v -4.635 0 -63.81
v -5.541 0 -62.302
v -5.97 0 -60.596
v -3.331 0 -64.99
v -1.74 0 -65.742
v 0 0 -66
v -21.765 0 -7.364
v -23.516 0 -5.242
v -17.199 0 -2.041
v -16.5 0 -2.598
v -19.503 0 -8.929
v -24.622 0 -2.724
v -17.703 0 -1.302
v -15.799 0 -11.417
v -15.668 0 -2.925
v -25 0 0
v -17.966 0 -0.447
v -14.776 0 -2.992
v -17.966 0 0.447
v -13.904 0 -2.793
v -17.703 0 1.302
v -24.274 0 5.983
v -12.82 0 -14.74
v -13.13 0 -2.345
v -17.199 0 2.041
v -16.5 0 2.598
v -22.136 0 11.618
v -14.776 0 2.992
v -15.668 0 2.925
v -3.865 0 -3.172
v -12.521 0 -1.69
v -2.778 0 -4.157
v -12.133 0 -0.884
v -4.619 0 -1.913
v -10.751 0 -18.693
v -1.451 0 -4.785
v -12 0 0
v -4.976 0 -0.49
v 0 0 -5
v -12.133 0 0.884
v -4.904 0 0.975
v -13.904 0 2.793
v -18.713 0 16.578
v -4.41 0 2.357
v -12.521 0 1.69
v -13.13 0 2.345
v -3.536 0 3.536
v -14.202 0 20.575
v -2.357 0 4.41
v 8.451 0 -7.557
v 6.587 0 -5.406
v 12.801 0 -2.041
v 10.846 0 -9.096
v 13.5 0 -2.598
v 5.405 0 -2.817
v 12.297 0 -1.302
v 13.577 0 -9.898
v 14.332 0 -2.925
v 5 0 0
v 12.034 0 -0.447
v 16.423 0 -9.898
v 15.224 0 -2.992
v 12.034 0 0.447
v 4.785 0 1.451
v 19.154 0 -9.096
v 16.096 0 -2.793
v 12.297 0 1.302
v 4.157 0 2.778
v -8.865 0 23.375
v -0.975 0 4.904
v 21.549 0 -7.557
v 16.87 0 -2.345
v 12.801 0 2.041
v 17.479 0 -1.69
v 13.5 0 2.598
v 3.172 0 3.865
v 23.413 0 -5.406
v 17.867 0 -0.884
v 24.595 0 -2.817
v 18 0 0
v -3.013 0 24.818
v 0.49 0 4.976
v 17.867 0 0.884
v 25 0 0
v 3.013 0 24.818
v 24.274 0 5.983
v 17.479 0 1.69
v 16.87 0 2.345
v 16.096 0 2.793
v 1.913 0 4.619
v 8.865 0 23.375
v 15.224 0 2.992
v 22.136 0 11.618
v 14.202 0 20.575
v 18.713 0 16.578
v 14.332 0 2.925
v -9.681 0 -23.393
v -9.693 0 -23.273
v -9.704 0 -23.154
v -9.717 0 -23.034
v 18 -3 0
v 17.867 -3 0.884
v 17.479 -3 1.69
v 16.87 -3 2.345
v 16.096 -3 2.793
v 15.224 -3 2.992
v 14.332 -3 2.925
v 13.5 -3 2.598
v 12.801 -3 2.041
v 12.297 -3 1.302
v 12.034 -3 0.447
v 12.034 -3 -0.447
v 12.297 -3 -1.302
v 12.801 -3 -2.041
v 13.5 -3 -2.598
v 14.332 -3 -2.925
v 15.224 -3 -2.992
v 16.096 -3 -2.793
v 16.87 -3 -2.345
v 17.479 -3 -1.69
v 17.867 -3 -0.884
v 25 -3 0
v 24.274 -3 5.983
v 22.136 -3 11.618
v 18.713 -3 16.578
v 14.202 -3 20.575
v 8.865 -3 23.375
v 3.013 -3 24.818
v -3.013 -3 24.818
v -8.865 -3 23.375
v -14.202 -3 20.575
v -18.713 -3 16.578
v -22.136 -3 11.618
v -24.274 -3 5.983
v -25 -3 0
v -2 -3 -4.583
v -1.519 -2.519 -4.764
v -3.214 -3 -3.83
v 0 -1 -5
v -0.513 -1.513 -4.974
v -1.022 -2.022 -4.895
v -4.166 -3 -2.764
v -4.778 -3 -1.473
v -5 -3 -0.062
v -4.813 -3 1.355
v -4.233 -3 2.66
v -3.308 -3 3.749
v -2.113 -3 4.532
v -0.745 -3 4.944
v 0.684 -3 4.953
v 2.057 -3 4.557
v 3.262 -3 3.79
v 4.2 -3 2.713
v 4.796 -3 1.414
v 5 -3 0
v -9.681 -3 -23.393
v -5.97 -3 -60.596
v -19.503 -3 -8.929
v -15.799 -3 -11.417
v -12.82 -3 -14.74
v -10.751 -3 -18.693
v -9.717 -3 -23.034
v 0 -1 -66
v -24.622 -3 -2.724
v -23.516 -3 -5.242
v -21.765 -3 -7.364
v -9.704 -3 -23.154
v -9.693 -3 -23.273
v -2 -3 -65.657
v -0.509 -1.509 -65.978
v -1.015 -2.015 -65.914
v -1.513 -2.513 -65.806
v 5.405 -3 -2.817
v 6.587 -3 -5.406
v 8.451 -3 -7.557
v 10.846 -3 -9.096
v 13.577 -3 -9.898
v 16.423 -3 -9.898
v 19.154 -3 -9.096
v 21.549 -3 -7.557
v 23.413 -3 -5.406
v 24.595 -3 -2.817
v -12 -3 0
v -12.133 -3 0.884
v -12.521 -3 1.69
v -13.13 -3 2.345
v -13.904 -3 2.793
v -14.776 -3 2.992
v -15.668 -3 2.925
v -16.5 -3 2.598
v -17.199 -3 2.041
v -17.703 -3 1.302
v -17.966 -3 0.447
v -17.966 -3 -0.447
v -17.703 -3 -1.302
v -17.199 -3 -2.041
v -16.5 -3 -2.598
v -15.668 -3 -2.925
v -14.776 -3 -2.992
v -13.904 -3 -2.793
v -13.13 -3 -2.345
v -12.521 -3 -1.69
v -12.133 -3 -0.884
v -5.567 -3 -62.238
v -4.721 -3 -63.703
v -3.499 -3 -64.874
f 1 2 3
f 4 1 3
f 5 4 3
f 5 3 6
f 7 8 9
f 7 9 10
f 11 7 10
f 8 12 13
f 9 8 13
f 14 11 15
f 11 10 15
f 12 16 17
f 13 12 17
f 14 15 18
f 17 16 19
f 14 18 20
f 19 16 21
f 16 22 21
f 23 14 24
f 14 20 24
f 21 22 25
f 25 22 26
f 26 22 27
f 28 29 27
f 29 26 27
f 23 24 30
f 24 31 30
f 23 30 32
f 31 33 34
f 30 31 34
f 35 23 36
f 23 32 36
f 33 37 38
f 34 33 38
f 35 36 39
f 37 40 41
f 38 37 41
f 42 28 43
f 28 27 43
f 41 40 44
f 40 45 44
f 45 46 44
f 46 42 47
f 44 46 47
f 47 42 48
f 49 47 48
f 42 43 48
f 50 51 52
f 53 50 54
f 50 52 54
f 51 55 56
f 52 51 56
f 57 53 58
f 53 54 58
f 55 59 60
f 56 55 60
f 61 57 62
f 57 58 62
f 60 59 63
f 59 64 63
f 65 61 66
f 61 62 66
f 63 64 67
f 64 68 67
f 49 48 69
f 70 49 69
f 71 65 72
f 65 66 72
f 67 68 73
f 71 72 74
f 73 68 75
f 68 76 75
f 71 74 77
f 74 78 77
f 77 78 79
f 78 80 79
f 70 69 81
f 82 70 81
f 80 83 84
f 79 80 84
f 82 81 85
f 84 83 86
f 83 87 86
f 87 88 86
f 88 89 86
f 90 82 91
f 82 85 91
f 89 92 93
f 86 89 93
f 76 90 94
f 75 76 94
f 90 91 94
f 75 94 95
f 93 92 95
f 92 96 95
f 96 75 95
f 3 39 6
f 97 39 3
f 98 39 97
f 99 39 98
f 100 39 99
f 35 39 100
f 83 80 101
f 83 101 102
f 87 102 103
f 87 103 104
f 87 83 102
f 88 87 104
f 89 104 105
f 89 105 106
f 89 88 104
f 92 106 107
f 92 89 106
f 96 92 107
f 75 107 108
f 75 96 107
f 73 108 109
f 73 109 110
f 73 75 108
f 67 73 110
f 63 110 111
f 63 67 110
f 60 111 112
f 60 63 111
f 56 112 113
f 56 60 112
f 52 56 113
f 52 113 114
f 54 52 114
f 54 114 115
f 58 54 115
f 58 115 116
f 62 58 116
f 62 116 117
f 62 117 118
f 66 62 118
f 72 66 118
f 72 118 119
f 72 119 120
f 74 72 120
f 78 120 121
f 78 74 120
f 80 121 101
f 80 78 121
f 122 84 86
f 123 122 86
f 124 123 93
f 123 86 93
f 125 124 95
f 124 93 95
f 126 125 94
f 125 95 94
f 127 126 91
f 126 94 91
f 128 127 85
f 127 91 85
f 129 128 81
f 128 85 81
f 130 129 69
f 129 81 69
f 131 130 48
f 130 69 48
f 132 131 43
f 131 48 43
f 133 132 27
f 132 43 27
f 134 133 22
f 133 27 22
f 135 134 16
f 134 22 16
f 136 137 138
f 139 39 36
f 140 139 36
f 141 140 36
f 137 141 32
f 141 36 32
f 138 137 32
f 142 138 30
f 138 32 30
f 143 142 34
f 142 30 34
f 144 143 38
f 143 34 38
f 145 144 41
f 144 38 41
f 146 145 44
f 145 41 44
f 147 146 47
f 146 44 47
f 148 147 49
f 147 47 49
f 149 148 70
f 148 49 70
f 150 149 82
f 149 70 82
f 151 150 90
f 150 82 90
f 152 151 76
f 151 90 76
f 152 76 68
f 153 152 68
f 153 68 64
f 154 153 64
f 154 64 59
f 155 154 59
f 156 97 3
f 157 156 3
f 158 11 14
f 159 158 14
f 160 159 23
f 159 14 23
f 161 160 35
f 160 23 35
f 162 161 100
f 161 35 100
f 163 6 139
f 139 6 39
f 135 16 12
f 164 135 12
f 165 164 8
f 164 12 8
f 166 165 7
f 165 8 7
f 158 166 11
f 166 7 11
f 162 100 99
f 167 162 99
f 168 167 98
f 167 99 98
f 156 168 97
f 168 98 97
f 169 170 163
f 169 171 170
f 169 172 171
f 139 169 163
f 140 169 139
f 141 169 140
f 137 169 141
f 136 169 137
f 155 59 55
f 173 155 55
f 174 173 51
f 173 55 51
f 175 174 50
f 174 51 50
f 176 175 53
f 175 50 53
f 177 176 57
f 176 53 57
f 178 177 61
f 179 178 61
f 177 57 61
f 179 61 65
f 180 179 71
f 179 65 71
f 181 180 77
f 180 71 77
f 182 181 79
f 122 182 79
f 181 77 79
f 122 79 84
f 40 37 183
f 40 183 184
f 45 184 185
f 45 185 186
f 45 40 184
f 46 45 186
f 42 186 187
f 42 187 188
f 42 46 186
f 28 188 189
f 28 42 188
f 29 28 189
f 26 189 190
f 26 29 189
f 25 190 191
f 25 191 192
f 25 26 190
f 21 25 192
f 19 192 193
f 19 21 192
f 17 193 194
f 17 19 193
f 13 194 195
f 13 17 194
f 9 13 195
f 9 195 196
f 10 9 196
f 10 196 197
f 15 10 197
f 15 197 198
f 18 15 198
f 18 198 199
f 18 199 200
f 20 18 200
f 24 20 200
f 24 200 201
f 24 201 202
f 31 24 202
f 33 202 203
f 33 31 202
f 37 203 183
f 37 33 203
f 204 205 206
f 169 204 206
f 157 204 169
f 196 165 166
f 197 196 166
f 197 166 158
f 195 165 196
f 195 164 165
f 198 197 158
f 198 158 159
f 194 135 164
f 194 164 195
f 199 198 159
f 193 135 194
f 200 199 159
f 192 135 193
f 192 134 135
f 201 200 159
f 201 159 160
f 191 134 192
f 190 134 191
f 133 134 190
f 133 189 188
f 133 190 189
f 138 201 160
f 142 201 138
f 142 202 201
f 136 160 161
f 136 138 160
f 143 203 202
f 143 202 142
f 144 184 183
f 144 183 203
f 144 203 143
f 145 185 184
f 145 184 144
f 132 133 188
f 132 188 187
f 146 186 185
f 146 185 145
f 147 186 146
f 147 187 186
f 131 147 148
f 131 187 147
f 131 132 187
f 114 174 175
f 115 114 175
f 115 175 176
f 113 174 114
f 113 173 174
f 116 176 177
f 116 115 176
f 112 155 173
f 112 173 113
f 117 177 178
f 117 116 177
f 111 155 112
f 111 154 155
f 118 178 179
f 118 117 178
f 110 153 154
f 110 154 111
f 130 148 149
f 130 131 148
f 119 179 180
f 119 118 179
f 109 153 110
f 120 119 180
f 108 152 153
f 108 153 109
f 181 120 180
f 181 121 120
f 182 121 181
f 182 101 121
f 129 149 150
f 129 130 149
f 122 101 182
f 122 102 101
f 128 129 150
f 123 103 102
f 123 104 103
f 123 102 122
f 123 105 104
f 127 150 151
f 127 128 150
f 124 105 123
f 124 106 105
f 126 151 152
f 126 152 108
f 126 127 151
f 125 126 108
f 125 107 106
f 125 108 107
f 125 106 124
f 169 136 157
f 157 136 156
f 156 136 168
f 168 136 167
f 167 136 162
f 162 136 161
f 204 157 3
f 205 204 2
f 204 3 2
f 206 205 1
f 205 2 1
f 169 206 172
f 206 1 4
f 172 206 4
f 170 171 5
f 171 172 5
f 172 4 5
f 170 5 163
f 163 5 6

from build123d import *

# Parameters (mm, degrees)
F0_R     = 3
F1_DEPTH = 3
F2_SIZE  = 2


with BuildPart() as f1:
    # F0 (on Front) → F1 (new body)
    with BuildSketch(Plane.XZ):
        with BuildLine():
            ThreePointArc((5, 0), (15, -10), (25, 0))
            ThreePointArc((25, 0), (0, 25), (-25, 0))
            ThreePointArc((-25, 0), (-23.515691, -5.242423), (-19.5034, -8.928571))
            ThreePointArc((-19.5034, -8.928571), (-12.820251, -14.739516), (-9.717181, -23.034244))
            ThreePointArc((-9.717181, -23.034244), (-9.698411, -23.213333), (-9.681434, -23.392601))
            Line((-9.681434, -23.392601), (-5.97037, -60.595556))
            ThreePointArc((-5.97037, -60.595556), (-4.026578, -64.448221), (0, -66))
            Line((0, -66), (0, -60))
            Line((0, -60), (0, -5))
            ThreePointArc((0, -5), (-3.535534, 3.535534), (5, 0))
        make_face()
        with Locations((-15, 0)):
            Circle(F0_R, mode=Mode.SUBTRACT)
        with Locations((15, 0)):
            Circle(F0_R, mode=Mode.SUBTRACT)
    extrude(amount=F1_DEPTH)

    # F2
    f2_edges = [f1.edges().sort_by_distance(p)[0] for p in [
        (0, -3, -35.5),
    ]]
    chamfer(f2_edges, length=F2_SIZE)


solid = f1.part
